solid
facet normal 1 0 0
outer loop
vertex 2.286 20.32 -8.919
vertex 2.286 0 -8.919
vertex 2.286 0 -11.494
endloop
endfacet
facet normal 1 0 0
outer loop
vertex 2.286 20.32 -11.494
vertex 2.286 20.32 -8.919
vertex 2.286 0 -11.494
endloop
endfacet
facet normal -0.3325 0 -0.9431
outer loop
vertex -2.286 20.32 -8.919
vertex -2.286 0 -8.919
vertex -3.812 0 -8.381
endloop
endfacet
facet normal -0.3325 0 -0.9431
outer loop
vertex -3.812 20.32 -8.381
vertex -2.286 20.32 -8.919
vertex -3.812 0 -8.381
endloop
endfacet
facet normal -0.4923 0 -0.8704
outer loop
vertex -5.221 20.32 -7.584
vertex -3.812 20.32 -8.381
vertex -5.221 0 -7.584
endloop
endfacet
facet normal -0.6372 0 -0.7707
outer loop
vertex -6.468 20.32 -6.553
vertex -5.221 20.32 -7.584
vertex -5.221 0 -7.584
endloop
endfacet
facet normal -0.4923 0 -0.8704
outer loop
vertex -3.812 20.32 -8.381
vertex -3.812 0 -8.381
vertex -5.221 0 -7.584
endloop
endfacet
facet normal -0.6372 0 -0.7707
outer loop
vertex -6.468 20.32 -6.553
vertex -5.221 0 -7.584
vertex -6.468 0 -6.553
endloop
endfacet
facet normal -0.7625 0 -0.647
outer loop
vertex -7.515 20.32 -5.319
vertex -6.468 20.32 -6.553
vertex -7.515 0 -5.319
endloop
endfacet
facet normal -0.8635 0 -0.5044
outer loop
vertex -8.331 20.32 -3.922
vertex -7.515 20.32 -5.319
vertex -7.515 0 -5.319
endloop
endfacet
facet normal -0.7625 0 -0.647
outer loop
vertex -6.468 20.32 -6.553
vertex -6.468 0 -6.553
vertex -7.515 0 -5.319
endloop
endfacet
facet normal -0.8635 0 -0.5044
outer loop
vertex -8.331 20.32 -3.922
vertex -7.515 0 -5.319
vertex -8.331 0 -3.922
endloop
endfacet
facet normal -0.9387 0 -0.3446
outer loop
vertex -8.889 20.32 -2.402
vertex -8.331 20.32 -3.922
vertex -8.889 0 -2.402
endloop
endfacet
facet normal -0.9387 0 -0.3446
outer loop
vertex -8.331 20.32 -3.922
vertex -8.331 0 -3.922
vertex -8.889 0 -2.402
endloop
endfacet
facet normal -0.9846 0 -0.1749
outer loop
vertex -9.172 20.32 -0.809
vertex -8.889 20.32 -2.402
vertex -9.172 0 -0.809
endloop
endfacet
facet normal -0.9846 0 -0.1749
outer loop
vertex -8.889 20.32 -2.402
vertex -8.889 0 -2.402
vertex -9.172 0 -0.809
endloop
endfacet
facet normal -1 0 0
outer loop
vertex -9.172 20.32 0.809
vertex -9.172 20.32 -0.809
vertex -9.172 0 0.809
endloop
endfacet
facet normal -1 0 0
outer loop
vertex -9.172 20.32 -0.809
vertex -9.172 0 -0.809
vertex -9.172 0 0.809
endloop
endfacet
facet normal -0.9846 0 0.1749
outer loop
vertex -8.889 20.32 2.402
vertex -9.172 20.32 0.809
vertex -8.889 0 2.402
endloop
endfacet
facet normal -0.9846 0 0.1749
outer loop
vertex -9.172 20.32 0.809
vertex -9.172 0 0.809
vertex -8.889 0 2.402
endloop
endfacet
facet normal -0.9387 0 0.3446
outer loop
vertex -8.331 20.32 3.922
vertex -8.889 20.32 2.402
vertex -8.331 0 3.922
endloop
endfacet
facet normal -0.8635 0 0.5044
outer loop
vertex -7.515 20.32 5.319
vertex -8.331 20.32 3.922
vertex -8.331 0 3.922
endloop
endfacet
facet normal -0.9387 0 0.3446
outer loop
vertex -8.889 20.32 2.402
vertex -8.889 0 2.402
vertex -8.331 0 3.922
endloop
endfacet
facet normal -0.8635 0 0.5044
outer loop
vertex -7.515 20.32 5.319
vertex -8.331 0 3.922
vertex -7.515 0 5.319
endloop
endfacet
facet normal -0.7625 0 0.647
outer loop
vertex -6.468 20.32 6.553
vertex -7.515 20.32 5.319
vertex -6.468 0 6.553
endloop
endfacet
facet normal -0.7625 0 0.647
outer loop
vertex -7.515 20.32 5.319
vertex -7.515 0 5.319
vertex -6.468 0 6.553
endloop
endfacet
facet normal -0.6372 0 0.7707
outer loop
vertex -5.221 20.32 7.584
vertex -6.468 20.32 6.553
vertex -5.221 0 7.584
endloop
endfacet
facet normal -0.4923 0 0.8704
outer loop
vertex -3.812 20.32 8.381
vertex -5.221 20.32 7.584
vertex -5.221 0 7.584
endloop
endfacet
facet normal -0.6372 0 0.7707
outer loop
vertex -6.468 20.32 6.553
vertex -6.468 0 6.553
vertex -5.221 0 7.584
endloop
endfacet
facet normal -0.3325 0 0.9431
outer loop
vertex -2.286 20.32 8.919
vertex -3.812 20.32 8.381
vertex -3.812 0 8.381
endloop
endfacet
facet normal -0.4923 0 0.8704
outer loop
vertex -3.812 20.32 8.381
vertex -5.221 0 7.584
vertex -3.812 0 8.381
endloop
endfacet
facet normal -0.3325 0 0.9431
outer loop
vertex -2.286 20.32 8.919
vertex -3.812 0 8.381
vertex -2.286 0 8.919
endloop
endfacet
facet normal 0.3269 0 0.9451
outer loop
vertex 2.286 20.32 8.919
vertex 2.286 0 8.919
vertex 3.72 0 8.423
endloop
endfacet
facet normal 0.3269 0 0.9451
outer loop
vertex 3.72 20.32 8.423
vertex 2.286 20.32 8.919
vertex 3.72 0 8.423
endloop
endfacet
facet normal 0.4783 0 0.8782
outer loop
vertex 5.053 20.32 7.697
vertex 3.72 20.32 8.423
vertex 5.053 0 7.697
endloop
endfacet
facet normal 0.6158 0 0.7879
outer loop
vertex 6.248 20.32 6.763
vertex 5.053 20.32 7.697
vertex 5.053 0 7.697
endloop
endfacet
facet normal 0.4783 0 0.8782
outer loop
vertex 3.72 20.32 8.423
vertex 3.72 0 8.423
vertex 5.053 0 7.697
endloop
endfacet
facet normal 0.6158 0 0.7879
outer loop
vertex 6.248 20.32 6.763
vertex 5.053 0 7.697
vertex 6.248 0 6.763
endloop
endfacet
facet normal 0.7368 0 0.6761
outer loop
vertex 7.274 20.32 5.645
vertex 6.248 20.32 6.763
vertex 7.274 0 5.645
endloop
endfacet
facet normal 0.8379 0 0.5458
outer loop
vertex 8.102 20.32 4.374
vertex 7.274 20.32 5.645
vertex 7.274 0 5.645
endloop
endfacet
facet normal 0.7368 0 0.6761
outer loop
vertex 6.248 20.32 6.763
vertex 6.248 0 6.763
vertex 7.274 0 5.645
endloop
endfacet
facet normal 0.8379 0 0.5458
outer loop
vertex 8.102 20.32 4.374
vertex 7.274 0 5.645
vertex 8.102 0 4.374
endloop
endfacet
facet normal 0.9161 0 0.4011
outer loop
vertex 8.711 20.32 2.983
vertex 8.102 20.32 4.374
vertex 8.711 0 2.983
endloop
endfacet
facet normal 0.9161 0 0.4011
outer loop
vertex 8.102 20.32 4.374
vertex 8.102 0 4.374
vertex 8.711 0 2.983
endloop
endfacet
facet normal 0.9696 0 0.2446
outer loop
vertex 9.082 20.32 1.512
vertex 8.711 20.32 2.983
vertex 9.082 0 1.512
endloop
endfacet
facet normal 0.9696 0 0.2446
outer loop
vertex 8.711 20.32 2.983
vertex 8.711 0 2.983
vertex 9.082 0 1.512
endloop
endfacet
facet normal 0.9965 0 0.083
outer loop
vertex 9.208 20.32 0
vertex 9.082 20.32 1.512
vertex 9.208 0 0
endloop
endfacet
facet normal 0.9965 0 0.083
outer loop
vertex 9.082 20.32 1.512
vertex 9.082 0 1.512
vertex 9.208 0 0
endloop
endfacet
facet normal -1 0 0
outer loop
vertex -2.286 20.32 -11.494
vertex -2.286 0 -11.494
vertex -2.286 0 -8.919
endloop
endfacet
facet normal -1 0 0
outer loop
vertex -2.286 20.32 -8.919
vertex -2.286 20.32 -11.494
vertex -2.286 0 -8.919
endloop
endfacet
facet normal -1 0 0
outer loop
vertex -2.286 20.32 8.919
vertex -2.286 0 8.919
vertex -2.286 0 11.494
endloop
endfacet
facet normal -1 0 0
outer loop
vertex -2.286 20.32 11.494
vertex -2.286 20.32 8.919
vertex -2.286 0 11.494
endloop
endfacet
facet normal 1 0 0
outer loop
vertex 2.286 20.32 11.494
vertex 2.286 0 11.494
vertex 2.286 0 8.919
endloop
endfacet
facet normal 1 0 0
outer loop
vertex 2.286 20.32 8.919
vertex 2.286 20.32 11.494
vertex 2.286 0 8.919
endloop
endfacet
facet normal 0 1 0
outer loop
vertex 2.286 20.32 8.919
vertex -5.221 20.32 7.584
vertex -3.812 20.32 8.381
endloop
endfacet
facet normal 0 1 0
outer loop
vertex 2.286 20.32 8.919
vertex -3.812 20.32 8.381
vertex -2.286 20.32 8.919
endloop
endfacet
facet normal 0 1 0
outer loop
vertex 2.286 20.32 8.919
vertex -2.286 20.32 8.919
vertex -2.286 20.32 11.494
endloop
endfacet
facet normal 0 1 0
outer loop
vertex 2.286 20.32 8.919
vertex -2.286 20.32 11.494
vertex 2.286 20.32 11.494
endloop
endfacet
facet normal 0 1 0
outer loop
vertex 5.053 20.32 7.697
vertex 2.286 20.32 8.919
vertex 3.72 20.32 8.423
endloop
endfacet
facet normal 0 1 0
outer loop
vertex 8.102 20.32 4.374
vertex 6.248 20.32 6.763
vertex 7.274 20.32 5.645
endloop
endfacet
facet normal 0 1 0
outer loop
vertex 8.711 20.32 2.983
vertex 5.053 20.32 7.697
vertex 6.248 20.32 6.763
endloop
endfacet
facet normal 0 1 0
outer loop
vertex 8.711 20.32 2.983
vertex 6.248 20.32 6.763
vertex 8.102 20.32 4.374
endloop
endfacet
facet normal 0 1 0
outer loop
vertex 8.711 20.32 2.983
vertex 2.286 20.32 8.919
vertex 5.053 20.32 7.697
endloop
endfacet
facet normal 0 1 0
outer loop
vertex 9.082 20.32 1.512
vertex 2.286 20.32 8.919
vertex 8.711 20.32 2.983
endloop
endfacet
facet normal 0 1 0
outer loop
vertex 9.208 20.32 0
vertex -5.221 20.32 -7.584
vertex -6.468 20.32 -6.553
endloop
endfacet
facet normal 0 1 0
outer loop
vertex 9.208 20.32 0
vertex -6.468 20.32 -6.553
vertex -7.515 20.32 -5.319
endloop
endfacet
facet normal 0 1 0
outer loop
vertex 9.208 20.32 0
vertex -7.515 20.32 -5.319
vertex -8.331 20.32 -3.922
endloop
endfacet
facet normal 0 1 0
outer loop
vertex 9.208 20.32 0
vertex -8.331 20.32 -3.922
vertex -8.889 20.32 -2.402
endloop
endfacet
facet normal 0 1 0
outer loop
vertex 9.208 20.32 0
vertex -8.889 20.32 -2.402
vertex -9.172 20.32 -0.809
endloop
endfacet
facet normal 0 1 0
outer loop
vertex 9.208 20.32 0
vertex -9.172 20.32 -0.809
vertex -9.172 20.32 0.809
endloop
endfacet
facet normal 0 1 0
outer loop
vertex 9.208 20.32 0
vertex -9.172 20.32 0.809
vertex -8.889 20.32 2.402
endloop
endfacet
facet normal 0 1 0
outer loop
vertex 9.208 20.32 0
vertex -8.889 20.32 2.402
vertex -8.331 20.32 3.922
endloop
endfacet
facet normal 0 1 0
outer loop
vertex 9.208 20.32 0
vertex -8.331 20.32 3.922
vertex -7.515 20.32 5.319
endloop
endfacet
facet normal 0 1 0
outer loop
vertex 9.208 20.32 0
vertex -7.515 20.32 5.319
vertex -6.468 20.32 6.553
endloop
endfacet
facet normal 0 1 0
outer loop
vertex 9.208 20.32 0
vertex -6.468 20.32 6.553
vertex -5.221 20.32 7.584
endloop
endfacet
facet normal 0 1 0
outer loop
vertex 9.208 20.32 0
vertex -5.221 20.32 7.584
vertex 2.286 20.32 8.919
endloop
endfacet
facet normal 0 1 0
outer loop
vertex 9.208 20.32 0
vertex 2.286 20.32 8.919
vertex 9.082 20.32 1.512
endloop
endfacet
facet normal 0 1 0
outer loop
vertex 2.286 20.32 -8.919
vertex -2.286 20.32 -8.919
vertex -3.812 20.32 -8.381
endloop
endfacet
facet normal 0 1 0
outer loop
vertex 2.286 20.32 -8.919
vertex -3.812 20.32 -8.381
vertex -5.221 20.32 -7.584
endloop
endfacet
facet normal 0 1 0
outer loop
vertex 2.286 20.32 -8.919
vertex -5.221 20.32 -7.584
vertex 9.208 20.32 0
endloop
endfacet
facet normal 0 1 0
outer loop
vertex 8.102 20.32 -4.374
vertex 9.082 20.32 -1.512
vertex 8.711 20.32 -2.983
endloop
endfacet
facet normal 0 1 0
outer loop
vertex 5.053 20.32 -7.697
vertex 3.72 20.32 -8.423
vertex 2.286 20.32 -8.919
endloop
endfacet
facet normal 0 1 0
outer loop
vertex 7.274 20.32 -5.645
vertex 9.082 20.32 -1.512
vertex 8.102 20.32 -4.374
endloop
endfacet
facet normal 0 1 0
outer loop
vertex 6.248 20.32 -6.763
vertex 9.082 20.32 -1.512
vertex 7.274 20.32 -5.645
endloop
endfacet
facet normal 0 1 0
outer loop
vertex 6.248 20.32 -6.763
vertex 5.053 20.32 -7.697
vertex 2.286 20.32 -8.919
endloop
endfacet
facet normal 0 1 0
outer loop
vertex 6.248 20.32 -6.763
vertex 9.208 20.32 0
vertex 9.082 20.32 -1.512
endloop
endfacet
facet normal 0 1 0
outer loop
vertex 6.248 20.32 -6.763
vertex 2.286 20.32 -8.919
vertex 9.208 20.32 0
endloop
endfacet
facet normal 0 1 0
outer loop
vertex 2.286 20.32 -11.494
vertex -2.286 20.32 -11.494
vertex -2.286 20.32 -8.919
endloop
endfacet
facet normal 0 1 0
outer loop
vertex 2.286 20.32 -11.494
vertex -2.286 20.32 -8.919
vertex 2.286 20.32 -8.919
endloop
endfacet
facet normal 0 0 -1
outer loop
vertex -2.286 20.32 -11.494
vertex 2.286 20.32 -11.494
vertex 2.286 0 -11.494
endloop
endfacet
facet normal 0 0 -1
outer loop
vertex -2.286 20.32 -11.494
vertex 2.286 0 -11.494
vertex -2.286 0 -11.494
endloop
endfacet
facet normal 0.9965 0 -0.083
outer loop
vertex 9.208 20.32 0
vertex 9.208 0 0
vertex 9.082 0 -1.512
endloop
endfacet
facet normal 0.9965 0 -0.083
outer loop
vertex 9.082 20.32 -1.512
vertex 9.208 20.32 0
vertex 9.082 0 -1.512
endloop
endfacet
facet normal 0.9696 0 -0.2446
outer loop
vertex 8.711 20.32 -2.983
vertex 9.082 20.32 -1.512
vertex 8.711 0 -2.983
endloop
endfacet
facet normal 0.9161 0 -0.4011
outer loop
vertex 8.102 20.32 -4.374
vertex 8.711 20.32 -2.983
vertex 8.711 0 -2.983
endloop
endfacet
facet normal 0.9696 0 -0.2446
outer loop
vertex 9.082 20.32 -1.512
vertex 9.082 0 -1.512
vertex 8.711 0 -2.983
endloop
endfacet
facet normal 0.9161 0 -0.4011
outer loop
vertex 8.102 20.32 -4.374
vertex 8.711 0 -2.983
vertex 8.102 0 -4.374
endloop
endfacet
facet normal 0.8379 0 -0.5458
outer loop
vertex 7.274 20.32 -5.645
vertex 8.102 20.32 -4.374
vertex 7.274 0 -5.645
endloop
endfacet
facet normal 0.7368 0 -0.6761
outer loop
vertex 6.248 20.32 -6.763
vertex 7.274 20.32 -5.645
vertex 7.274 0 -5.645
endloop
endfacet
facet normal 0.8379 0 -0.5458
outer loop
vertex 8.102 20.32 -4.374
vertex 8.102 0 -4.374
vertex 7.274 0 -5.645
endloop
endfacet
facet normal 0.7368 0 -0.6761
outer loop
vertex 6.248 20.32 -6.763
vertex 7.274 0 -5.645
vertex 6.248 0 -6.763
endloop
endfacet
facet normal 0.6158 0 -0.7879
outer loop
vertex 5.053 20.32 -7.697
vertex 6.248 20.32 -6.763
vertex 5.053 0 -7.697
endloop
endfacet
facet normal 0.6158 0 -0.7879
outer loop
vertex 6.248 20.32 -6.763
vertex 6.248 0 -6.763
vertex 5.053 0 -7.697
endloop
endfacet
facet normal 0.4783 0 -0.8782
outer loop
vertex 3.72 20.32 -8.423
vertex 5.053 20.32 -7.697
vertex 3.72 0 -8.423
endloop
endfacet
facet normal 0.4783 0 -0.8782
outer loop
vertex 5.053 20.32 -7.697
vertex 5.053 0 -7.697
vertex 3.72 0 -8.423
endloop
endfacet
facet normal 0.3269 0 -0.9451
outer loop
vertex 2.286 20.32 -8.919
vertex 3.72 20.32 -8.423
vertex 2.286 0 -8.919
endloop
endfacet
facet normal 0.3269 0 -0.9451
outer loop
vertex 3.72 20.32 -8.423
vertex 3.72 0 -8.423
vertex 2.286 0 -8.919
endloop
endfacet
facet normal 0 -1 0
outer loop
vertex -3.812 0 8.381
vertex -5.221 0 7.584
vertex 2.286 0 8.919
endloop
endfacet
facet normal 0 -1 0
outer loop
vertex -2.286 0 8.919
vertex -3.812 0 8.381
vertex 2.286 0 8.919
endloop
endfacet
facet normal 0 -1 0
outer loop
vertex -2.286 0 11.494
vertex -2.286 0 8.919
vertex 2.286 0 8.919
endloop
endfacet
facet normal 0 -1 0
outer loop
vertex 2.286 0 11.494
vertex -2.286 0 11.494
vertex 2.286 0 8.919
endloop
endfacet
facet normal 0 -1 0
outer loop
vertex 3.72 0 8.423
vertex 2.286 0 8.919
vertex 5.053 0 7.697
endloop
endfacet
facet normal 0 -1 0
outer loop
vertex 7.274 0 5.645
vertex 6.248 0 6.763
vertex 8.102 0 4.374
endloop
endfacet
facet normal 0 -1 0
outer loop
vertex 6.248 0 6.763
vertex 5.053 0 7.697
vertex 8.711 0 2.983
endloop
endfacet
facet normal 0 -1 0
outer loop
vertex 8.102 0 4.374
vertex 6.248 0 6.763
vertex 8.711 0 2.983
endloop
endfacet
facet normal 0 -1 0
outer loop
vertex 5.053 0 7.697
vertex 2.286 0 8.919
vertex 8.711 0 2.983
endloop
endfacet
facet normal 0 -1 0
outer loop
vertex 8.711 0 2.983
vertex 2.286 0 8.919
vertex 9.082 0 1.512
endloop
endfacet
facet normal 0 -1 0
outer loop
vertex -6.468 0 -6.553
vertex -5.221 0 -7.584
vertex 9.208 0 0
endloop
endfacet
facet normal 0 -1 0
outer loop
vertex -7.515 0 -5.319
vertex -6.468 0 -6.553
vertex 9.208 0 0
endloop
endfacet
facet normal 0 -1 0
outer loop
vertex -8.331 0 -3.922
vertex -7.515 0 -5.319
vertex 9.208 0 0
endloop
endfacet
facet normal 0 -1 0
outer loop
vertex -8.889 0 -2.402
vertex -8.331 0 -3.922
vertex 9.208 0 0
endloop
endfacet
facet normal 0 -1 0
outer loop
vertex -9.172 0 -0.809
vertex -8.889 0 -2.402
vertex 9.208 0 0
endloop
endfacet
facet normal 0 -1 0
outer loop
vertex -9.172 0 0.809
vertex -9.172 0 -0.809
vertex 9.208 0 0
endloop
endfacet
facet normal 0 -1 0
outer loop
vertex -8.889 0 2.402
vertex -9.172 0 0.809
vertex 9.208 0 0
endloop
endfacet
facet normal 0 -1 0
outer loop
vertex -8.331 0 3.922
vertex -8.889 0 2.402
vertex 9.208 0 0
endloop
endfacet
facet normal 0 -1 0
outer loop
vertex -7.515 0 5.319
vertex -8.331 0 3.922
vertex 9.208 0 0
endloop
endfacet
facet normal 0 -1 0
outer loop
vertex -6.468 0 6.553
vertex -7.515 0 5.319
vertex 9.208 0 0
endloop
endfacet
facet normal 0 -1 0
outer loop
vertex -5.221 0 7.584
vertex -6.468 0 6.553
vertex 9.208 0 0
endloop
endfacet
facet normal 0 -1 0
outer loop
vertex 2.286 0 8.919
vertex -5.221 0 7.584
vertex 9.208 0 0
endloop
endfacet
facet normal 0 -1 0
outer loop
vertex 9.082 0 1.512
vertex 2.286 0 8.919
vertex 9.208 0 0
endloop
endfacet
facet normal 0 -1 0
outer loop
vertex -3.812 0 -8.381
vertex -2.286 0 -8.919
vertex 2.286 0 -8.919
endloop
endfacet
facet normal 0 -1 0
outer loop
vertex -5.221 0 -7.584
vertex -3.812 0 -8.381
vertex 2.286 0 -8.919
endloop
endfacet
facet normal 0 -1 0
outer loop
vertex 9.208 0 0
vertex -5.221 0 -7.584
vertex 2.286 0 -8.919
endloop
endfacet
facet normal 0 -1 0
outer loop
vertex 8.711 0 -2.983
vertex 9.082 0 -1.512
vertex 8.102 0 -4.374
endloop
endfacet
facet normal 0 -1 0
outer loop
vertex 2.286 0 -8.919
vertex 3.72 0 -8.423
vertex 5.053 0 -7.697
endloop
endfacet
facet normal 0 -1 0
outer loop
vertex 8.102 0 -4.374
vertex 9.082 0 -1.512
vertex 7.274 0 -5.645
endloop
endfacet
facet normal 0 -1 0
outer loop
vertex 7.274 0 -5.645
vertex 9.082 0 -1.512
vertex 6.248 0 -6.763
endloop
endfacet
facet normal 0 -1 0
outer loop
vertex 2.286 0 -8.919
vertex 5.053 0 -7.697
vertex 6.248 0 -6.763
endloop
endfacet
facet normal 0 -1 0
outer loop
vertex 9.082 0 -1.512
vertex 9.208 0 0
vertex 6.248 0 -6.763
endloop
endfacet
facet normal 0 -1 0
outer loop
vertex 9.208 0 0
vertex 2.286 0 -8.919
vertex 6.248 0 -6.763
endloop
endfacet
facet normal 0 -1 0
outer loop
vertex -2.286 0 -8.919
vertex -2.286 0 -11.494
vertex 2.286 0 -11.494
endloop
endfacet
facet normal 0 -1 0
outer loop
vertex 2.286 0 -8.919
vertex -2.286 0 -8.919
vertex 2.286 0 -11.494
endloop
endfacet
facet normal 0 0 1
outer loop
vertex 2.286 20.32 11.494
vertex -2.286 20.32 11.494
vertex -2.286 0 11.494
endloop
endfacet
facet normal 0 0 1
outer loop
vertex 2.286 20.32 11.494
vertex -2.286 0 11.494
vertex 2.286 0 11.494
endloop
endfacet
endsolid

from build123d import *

# Parameters (mm, degrees)
BOSS_EXTRUDE1_DEPTH = 20.32


with BuildPart() as part:
    # Sketch1 → Boss-Extrude1 (new body)
    with BuildSketch(Plane(origin=(0, 0, 0), x_dir=(1, 0, 0), z_dir=(0, 1, 0))):
        with BuildLine():
            Line((-2.286, 11.4935), (-2.286, 8.919207378))
            ThreePointArc((-2.286, 8.919207378), (0, 9.2075), (2.286, 8.919207378))
            Line((2.286, 8.919207378), (2.286, 11.4935))
            Line((2.286, 11.4935), (-2.286, 11.4935))
        make_face()
        with BuildLine():
            Line((-2.286, 8.919207378), (-2.286, 6.9215))
            Line((-2.286, 6.9215), (2.286, 6.9215))
            Line((2.286, 6.9215), (2.286, 8.919207378))
            ThreePointArc((2.286, 8.919207378), (0, 9.2075), (-2.286, 8.919207378))
        make_face()
        with BuildLine():
            Line((2.286, 6.9215), (-2.286, 6.9215))
            Line((-2.286, 6.9215), (-2.286, 8.919207378))
            ThreePointArc((-2.286, 8.919207378), (-9.2075, 0), (-2.286, -8.919207378))
            Line((-2.286, -8.919207378), (-2.286, -6.9215))
            Line((-2.286, -6.9215), (2.286, -6.9215))
            Line((2.286, -6.9215), (2.286, -8.919207378))
            ThreePointArc((2.286, -8.919207378), (7.274146041, -5.644896423), (9.2075, 0))
            ThreePointArc((9.2075, 0), (7.274146041, 5.644896423), (2.286, 8.919207378))
            Line((2.286, 8.919207378), (2.286, 6.9215))
        make_face()
        with BuildLine():
            Line((-2.286, -6.9215), (-2.286, -8.919207378))
            ThreePointArc((-2.286, -8.919207378), (0, -9.2075), (2.286, -8.919207378))
            Line((2.286, -8.919207378), (2.286, -6.9215))
            Line((2.286, -6.9215), (-2.286, -6.9215))
        make_face()
        with BuildLine():
            ThreePointArc((2.286, -8.919207378), (0, -9.2075), (-2.286, -8.919207378))
            Line((-2.286, -8.919207378), (-2.286, -11.4935))
            Line((-2.286, -11.4935), (2.286, -11.4935))
            Line((2.286, -11.4935), (2.286, -8.919207378))
        make_face()
    extrude(amount=BOSS_EXTRUDE1_DEPTH)


solid = part.part
